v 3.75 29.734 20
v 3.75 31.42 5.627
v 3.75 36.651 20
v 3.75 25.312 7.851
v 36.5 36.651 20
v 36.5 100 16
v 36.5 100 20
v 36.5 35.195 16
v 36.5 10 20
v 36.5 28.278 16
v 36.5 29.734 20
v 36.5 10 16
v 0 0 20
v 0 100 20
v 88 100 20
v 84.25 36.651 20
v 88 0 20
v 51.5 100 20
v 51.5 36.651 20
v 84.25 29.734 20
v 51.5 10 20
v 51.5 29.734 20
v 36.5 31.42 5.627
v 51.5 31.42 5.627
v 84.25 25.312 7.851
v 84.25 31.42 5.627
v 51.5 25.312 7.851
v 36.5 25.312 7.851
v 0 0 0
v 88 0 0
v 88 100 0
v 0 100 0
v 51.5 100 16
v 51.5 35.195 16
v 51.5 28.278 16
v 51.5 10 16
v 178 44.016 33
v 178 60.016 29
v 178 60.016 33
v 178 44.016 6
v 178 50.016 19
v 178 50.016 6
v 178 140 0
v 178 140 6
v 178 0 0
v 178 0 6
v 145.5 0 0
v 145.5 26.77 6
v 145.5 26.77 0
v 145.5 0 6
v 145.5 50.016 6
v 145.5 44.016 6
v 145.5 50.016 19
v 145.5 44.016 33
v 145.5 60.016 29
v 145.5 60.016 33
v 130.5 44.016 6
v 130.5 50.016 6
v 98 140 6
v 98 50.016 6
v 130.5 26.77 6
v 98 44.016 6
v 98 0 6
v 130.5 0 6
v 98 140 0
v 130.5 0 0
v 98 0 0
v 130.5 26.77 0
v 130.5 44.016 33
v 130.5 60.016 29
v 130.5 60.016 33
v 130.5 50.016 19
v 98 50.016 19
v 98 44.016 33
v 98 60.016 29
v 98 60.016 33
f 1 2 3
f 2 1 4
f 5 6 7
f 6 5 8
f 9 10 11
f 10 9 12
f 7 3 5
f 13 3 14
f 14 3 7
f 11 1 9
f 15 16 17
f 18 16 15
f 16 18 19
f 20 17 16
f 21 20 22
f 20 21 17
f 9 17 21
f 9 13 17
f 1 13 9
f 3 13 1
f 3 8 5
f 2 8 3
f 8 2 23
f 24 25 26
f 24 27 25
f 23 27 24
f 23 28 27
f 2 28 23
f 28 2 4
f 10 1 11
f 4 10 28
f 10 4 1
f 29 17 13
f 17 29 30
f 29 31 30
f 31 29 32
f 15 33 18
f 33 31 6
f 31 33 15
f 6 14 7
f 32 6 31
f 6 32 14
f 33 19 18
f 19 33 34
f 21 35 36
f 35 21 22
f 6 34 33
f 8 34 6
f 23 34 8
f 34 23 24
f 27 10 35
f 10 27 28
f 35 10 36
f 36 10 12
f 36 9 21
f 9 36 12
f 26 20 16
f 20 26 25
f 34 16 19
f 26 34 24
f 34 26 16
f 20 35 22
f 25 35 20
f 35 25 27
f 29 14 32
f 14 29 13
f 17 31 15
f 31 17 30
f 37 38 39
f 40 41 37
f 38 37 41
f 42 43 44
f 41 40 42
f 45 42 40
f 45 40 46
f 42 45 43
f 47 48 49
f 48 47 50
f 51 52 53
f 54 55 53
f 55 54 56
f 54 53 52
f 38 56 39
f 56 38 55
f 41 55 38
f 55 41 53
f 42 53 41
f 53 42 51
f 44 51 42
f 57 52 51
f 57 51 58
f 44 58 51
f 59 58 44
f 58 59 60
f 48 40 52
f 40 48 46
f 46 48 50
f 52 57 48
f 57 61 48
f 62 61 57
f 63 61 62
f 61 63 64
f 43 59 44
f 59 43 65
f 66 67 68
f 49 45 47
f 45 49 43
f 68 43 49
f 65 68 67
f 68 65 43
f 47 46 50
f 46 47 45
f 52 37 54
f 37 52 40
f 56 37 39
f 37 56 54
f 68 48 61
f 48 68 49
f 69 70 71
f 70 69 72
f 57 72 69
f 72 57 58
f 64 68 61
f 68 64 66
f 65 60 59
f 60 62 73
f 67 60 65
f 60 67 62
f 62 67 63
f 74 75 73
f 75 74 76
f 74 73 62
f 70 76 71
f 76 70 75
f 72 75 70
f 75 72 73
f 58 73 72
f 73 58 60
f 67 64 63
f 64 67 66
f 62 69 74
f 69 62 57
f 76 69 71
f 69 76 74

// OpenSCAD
// ── SUPORTE DE TELEMÓVEL DE SECRETÁRIA EM DUAS PEÇAS (ENCAIXE) ──
//
// Duas peças que se encaixam na hora de usar: as COSTAS (placa inclinada com o apoio em V e o
// rebordo à frente) entram numa ranhura inclinada da BASE (bloco). Desmontado fica plano para
// guardar ou levar.
// Com ranhura_cabo: abertura a meio do apoio (a ficha desce do telemóvel), arco no fundo das
// costas e canal no topo da base, por onde o cabo passa para trás.
//
// Coordenadas de uso (perfil em XY, largura em Z): x para trás a partir da frente da base,
// y para cima, z na largura. As costas definem-se num referencial próprio (u ao longo da placa,
// a subir; w para trás, perpendicular à placa; frente da placa em w = 0):
//   mundo = B0 + u·V + w·N,  V = (sin a, cos a),  N = (cos a, -sin a)
//   B0 = (xs - dr·tan a, hb - dr)  — canto da frente do fundo das costas, dentro da ranhura
// Apoio (no referencial u,w; d = -w para a frente): seat em u = us, rebordo até us + hl,
// face interior a 45° (V) — imprime-se sem suportes com as costas deitadas.
//
// Saídas (peca): "Tudo" (as duas deitadas para imprimir), "Costas", "Base", "Montado".
// Parâmetros: peca, largura, altura_costas, angulo, altura_apoio, espessura_telemovel,
//   altura_labio, espessura, profundidade_base, altura_base, profundidade_encaixe, folga_encaixe,
//   ranhura_cabo, largura_ranhura.
// Se mudares as fórmulas, muda também Maker_Pro_Frontend_Prod/lib/suporteEncaixe.ts.

function _b(v, d) = is_undef(v) ? d : (v == true || v == 1 || v == "true");
function _peca() = is_undef(peca) ? "Tudo" : peca;
function _W()   = is_undef(largura) ? 80 : largura;
function _Lc()  = is_undef(altura_costas) ? 140 : altura_costas;
function _a()   = is_undef(angulo) ? 20 : angulo;
function _Hs()  = is_undef(altura_apoio) ? 55 : altura_apoio;
function _g()   = is_undef(espessura_telemovel) ? 13 : espessura_telemovel;
function _hl()  = is_undef(altura_labio) ? 10 : altura_labio;
function _e()   = is_undef(espessura) ? 6 : espessura;
function _Db()  = is_undef(profundidade_base) ? 100 : profundidade_base;
function _hb()  = is_undef(altura_base) ? 20 : altura_base;
function _dr0() = is_undef(profundidade_encaixe) ? 12 : profundidade_encaixe;
function _f()   = is_undef(folga_encaixe) ? 0.25 : folga_encaixe;
function _rc()  = _b(is_undef(ranhura_cabo) ? undef : ranhura_cabo, true);
function _wr()  = min(is_undef(largura_ranhura) ? 15 : largura_ranhura, _W() - 20);

// ── derivados (iguais em lib/suporteEncaixe.ts) ──
function _s()  = sin(_a());
function _c()  = cos(_a());
function _pw() = 4;                                                  // paredes dos lados da ranhura
function _el() = max(_e(), 6);                                       // espessura do apoio (ao longo da placa)
function _tt() = 4;                                                  // espessura do topo do rebordo
function _Dl() = _g() + _hl() + _tt();                               // quanto o apoio sai para a frente
function _cg() = 4;                                                  // profundidade do canal do cabo na base
function _dr() = max(4, min(_dr0(), _hb() - 3 - _f() * _c() - (_e() + _f()) * _s()));
function _xs() = max(0.3 * _Db(), 3 + _dr() * tan(_a()) + _f() * (_s() + _c()) + 1);
function _B0() = [_xs() - _dr() * tan(_a()), _hb() - _dr()];
function _ut() = (_hb() - _B0()[1]) / _c();                          // u onde a placa sai da base
function _ha() = _rc() ? _ut() + 14 : 0;                             // altura do arco do cabo (em u)
function _us() = max(min((_Hs() - _B0()[1]) / _c(), _Lc() - _hl() - 10),
                     (_rc() ? _ha() : _ut()) + _el() + 3);
function _D()  = max(_Db(), _B0()[0] + _Lc() * _s() + _e() * _c() + 5);   // a base cobre o topo
function _z0() = (_W() - _wr()) / 2;
function _z1() = (_W() + _wr()) / 2;

// ── perfis 2D ──
module perfil_costas(com_apoio = true) {                             // no referencial (u, w)
    us = _us(); el = _el(); hl = _hl(); g = _g(); Dl = _Dl();
    square([_Lc(), _e()]);
    if (com_apoio)
        polygon([[us - el, 0], [us - el, -Dl], [us + hl, -Dl], [us + hl, -(g + hl)], [us, -g], [us, 0]]);
}
// placa sem apoio e sem o arco (fatia do meio quando há ranhura para o cabo)
module perfil_costas_meio() { translate([_ha(), 0]) square([_Lc() - _ha(), _e()]); }

function _paraMundo(p) = _B0() + p[0] * [_s(), _c()] + p[1] * [_c(), -_s()];
module ranhura_2d() {                                                // a ranhura, já no mundo (x, y)
    f = _f(); L = _Lc();
    polygon([for (p = [[-f, -f], [L, -f], [L, _e() + f], [-f, _e() + f]]) _paraMundo(p)]);
}
module perfil_base(ranhura = true, canal = false) {
    difference() {
        square([_D(), _hb()]);
        if (ranhura) ranhura_2d();
        if (canal) translate([max(3, _xs() - 20), _hb() - _cg()]) square([_D(), _cg() + 1]);
    }
}

// ── peças (no seu referencial) ──
module costas_local() {                                              // u, w, z
    if (_rc()) {
        linear_extrude(height = _z0()) perfil_costas();
        translate([0, 0, _z0()]) linear_extrude(height = _wr()) perfil_costas_meio();
        translate([0, 0, _z1()]) linear_extrude(height = _W() - _z1()) perfil_costas();
    } else linear_extrude(height = _W()) perfil_costas();
}
module base_mundo() {                                                // x, y, z
    pw = _pw(); f = _f(); W = _W();
    translate([0, 0, -pw]) linear_extrude(height = pw - f) perfil_base(false);
    translate([0, 0, W + f]) linear_extrude(height = pw - f) perfil_base(false);
    if (_rc()) {
        translate([0, 0, -f]) linear_extrude(height = _z0() + f) perfil_base();
        translate([0, 0, _z0()]) linear_extrude(height = _wr()) perfil_base(true, true);
        translate([0, 0, _z1()]) linear_extrude(height = W + f - _z1()) perfil_base();
    } else translate([0, 0, -f]) linear_extrude(height = W + 2 * f) perfil_base();
}

// ── colocações ──
module costas_montadas() {
    B = _B0(); s = _s(); c = _c();
    multmatrix([[s, c, 0, B[0]], [c, -s, 0, B[1]], [0, 0, 1, 0], [0, 0, 0, 1]]) costas_local();
}
module costas_imprimir() {                                           // costas para baixo, apoio para cima
    multmatrix([[0, 0, -1, _W()], [1, 0, 0, 0], [0, -1, 0, _e()], [0, 0, 0, 1]]) costas_local();
}
module base_imprimir() {                                             // deitada como em uso
    multmatrix([[0, 0, 1, _pw()], [1, 0, 0, 0], [0, 1, 0, 0], [0, 0, 0, 1]]) base_mundo();
}

if (_peca() == "Costas") costas_imprimir();
else if (_peca() == "Base") base_imprimir();
else if (_peca() == "Montado") { base_mundo(); costas_montadas(); }
else {
    base_imprimir();
    translate([_W() + 2 * _pw() + 10, 0, 0]) costas_imprimir();
}
